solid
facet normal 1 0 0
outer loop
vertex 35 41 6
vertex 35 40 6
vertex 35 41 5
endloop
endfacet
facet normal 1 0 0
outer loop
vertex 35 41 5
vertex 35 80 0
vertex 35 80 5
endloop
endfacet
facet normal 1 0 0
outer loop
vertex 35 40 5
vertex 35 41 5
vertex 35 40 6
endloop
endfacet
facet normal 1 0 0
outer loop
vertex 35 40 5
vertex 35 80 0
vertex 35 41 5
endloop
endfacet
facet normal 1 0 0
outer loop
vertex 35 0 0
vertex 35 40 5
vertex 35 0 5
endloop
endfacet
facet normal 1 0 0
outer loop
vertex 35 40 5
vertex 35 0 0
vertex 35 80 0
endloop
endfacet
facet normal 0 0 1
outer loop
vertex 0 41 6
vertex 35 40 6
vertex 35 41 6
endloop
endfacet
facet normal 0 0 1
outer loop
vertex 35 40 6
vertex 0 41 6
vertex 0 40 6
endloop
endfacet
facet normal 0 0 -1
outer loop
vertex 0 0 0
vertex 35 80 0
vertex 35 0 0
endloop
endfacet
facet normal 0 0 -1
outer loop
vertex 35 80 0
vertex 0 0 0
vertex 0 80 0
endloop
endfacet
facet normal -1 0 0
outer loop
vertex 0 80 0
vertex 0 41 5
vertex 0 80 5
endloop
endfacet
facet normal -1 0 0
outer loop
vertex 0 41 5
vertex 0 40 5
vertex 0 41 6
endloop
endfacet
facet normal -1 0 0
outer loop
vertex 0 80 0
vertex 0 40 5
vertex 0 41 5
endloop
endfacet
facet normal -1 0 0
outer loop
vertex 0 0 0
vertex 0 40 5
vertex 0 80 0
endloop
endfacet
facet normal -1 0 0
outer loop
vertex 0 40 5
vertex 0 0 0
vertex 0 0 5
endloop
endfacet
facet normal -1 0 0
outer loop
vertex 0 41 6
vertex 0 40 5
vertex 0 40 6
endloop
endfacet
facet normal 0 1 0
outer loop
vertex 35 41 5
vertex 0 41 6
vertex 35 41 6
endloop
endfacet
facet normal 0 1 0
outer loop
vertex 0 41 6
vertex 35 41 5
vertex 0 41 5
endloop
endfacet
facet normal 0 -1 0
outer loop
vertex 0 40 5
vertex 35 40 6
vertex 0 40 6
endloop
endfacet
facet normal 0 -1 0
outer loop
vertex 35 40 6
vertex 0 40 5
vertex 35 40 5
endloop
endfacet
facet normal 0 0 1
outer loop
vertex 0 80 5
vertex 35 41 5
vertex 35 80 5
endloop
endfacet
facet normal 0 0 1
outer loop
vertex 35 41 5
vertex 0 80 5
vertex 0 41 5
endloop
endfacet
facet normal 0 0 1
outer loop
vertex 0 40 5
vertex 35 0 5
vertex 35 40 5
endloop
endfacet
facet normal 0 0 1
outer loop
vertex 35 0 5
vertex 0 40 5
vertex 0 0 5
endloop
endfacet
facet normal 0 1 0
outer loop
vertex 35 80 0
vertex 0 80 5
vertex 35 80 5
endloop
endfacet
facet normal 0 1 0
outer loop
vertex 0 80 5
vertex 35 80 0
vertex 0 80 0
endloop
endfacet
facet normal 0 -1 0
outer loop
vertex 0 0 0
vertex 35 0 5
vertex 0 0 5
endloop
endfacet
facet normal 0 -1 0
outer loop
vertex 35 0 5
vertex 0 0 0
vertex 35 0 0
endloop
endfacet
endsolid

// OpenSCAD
// Loguncov Maxim 13.12.13


$fn=128;


translate([0,40,0])cube([35,1,6]);

difference() {

//основа
cube([35,80,5]);





}
